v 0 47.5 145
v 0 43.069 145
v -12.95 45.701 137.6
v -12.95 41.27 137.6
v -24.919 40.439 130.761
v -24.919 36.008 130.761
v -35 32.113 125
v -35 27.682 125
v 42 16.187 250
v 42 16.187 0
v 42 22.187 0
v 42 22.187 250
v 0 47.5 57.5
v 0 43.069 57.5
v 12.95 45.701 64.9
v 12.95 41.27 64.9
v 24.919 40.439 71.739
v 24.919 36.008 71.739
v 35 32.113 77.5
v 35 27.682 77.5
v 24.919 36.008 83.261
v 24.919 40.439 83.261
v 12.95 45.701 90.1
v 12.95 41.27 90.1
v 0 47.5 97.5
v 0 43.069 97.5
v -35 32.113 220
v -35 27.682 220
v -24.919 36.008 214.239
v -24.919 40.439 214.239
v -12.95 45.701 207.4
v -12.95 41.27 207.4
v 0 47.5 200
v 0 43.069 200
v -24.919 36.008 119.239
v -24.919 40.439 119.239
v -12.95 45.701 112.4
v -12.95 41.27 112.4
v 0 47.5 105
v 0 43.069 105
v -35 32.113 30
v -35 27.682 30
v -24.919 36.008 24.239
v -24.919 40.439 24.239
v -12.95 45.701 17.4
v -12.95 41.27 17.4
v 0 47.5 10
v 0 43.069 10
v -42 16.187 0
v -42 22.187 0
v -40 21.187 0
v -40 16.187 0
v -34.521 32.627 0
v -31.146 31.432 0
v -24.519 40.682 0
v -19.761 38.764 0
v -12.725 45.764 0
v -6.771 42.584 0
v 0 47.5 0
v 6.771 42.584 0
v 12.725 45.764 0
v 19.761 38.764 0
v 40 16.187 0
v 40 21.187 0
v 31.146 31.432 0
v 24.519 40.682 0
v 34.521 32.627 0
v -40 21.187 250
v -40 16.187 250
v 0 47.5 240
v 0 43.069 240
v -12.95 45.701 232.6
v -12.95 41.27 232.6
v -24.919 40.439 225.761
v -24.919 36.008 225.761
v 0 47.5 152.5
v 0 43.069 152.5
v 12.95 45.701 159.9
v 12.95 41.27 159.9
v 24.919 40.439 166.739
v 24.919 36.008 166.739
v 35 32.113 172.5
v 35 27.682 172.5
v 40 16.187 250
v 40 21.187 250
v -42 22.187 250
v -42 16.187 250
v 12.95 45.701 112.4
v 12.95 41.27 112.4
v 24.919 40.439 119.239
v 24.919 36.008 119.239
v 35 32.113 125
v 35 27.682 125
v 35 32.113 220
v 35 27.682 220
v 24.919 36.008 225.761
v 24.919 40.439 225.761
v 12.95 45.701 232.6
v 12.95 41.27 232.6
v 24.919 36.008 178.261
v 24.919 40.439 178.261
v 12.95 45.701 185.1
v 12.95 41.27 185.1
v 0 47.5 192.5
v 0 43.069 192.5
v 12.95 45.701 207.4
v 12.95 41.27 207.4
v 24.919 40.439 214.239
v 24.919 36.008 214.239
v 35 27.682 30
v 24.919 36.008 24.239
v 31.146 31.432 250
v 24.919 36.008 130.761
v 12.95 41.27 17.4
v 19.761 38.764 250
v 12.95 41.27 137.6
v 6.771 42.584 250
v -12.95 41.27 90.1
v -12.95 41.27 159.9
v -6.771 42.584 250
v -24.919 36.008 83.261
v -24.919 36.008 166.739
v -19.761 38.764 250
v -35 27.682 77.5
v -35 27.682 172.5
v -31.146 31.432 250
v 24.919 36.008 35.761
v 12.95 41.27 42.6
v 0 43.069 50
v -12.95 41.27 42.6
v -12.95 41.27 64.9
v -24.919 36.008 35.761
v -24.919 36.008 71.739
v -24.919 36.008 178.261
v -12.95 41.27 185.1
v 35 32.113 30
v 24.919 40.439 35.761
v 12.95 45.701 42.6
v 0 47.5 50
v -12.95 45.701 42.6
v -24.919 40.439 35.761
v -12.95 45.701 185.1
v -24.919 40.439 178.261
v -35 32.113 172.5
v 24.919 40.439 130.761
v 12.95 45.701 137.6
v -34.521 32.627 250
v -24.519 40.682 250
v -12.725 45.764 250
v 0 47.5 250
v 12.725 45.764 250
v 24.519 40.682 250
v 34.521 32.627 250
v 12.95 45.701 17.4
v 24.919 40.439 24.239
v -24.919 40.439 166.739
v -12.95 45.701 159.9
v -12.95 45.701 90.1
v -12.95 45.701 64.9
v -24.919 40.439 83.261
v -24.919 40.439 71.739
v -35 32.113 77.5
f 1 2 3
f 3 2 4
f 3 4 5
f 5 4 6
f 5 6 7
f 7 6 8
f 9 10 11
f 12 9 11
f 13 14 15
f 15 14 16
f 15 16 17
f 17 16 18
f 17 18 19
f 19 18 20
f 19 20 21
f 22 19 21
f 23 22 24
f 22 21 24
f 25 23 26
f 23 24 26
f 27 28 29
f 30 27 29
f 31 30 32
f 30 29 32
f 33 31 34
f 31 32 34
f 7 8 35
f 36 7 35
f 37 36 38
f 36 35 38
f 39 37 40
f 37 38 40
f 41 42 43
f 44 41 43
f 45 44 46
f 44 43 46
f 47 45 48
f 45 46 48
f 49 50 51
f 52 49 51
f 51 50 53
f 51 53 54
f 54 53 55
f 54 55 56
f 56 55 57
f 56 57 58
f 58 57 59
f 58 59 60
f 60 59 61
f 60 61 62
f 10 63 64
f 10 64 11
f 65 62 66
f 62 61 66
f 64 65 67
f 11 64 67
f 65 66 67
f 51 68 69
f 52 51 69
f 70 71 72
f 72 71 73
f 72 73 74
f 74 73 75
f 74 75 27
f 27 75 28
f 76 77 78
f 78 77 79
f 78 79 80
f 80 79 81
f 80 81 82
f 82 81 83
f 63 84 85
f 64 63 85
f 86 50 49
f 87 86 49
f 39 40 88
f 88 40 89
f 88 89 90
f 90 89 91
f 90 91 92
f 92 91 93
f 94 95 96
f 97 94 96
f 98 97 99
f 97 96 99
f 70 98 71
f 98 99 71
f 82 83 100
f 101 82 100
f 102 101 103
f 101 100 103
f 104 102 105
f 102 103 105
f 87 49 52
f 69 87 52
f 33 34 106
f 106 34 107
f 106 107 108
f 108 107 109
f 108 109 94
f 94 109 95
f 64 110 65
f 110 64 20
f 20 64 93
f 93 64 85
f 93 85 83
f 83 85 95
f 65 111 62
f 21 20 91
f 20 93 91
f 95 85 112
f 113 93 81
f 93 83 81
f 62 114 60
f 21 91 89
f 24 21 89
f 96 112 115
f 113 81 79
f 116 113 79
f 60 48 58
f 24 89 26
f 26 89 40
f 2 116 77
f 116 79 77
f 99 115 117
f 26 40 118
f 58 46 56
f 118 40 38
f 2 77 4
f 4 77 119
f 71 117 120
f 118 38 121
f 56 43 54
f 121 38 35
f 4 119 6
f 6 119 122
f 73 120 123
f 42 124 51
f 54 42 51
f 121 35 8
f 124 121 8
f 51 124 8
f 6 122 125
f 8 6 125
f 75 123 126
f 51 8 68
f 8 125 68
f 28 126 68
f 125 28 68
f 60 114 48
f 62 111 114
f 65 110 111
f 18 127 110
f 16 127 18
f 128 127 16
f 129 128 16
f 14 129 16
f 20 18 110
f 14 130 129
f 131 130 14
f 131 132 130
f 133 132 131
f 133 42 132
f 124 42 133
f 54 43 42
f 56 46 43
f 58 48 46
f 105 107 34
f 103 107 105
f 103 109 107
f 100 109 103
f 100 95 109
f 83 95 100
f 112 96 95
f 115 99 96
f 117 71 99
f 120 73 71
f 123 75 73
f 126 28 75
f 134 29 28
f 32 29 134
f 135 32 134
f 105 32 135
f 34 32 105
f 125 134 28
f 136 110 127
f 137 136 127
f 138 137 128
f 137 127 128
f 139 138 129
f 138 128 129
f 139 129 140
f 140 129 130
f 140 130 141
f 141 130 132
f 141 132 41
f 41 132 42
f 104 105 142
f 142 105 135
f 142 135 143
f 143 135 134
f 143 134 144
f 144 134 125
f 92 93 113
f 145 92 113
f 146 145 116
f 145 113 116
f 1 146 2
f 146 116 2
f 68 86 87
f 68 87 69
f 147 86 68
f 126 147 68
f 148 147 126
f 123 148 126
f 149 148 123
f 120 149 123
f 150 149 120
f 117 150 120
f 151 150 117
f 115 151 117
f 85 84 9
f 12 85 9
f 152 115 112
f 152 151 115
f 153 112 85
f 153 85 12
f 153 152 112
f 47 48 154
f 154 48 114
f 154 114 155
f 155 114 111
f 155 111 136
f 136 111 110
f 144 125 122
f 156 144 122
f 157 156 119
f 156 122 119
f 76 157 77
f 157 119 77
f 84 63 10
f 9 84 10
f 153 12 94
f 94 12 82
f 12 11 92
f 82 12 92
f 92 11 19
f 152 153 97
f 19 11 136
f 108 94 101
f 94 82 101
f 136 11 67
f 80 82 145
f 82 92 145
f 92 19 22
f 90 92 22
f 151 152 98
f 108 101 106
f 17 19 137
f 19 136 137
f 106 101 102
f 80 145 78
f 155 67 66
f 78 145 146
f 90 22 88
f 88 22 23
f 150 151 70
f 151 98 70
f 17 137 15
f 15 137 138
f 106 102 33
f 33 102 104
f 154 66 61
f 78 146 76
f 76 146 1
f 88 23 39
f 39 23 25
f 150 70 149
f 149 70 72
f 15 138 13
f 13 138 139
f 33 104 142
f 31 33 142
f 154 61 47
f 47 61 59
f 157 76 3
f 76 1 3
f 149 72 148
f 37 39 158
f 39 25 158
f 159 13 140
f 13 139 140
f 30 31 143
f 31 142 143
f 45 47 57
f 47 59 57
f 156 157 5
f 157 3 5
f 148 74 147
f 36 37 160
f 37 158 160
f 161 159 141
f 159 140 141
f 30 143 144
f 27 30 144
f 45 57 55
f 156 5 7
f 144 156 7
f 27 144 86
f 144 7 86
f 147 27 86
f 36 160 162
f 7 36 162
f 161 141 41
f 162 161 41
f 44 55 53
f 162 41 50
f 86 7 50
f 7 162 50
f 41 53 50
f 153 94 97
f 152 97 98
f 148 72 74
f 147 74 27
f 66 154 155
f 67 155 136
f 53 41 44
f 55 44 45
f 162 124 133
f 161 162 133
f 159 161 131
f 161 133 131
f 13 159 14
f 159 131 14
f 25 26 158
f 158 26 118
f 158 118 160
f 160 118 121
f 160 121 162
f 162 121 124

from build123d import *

# Parameters (mm, degrees)
F1_DEPTH = 250
F3_DEPTH = 250.001
F5_DEPTH = 47.501


with BuildPart() as f1:
    # F0 (on Top) → F1 (new body)
    with BuildSketch(Plane.XY):
        with BuildLine():
            Line((42, 16.186708), (42, 22.186708))
            ThreePointArc((42, 22.186708), (0, 47.5), (-42, 22.186708))
            Line((-42, 22.186708), (-42, 16.186708))
            Line((-42, 16.186708), (42, 16.186708))
        make_face()
    extrude(amount=F1_DEPTH)

    # F2 (on face) → F3 (cut, through all)
    with BuildSketch(Plane.XY.offset(250)):
        with BuildLine():
            ThreePointArc((40, 21.186708), (0, 43.069331), (-40, 21.186708))
            Line((-40, 21.186708), (-40, 16.186708))
            Line((-40, 16.186708), (40, 16.186708))
            Line((40, 16.186708), (40, 21.186708))
        make_face()
    extrude(amount=-F3_DEPTH, mode=Mode.SUBTRACT)

    # F4 (on Front) → F5 (cut, through all)
    with BuildSketch(Plane.XZ):
        Polygon((35, 220), (0, 240), (-35, 220), (0, 200), align=None)
        Polygon((35, 172.5), (0, 192.5), (-35, 172.5), (0, 152.5), align=None)
        Polygon((35, 125), (0, 145), (-35, 125), (0, 105), align=None)
        Polygon((35, 77.5), (0, 97.5), (-35, 77.5), (0, 57.5), align=None)
        Polygon((35, 30), (0, 50), (-35, 30), (0, 10), align=None)
    extrude(amount=-F5_DEPTH, mode=Mode.SUBTRACT)


solid = f1.part
